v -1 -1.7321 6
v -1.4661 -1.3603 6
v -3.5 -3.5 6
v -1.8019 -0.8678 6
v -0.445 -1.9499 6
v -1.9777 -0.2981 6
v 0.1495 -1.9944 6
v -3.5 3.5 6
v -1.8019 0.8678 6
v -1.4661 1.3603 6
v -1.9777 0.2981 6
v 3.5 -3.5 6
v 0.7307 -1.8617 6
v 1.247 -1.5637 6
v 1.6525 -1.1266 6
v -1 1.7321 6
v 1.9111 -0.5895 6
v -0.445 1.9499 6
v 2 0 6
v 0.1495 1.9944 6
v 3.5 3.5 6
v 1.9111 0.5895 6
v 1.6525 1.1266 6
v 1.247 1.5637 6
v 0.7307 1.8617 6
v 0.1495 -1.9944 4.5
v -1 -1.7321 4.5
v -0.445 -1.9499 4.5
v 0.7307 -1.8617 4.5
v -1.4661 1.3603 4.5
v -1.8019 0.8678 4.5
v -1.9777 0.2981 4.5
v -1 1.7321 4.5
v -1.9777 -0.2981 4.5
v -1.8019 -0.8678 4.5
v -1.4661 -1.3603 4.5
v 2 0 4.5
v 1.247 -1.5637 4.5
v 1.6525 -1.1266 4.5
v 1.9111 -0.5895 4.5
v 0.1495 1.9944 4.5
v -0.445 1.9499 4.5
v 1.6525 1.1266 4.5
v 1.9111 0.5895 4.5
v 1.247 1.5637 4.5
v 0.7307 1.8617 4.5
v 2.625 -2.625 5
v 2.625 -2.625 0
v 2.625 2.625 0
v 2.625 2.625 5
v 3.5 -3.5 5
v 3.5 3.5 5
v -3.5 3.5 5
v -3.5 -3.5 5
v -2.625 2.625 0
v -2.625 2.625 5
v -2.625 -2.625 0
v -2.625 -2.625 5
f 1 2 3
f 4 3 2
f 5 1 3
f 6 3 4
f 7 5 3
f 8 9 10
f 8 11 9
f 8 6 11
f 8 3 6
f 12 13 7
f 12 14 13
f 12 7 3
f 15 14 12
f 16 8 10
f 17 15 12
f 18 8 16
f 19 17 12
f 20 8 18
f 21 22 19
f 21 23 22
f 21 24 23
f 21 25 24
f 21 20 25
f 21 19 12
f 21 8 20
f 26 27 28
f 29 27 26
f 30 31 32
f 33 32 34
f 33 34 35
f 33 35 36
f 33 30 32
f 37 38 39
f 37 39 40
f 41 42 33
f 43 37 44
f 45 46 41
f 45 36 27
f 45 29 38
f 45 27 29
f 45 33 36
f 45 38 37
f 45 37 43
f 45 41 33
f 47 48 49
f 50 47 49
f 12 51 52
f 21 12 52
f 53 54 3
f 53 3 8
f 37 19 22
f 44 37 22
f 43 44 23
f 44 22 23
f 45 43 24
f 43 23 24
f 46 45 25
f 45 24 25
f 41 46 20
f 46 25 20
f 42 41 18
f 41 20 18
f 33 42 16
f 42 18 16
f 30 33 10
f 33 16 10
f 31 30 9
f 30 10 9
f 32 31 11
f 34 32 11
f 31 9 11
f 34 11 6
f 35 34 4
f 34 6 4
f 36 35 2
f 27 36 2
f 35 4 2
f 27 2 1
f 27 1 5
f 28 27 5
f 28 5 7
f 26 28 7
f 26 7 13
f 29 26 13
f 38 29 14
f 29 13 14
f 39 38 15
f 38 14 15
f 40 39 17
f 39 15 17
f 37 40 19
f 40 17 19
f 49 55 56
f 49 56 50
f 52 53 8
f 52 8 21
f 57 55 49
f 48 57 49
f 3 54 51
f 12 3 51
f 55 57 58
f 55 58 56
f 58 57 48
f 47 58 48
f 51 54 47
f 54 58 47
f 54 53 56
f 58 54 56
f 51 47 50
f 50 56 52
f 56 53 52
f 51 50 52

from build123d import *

# Parameters (mm, degrees)
F0_W     = 5.25
F0_H     = 5.25
F1_DEPTH = 5
F2_W     = 7
F2_H     = 7
F3_DEPTH = 1
F4_R     = 2
F5_DEPTH = 1.5


with BuildPart() as f1:
    # F0 (on Top) → F1 (new body)
    with BuildSketch(Plane.XY):
        Rectangle(F0_W, F0_H)
    extrude(amount=F1_DEPTH)

    # F2 (on face) → F3 (join)
    with BuildSketch(Plane.XY.offset(5)):
        Rectangle(F2_W, F2_H)
    extrude(amount=F3_DEPTH)

    # F4 (on face) → F5 (cut)
    with BuildSketch(Plane.XY.offset(6)):
        Circle(F4_R)
    extrude(amount=-F5_DEPTH, mode=Mode.SUBTRACT)


solid = f1.part
